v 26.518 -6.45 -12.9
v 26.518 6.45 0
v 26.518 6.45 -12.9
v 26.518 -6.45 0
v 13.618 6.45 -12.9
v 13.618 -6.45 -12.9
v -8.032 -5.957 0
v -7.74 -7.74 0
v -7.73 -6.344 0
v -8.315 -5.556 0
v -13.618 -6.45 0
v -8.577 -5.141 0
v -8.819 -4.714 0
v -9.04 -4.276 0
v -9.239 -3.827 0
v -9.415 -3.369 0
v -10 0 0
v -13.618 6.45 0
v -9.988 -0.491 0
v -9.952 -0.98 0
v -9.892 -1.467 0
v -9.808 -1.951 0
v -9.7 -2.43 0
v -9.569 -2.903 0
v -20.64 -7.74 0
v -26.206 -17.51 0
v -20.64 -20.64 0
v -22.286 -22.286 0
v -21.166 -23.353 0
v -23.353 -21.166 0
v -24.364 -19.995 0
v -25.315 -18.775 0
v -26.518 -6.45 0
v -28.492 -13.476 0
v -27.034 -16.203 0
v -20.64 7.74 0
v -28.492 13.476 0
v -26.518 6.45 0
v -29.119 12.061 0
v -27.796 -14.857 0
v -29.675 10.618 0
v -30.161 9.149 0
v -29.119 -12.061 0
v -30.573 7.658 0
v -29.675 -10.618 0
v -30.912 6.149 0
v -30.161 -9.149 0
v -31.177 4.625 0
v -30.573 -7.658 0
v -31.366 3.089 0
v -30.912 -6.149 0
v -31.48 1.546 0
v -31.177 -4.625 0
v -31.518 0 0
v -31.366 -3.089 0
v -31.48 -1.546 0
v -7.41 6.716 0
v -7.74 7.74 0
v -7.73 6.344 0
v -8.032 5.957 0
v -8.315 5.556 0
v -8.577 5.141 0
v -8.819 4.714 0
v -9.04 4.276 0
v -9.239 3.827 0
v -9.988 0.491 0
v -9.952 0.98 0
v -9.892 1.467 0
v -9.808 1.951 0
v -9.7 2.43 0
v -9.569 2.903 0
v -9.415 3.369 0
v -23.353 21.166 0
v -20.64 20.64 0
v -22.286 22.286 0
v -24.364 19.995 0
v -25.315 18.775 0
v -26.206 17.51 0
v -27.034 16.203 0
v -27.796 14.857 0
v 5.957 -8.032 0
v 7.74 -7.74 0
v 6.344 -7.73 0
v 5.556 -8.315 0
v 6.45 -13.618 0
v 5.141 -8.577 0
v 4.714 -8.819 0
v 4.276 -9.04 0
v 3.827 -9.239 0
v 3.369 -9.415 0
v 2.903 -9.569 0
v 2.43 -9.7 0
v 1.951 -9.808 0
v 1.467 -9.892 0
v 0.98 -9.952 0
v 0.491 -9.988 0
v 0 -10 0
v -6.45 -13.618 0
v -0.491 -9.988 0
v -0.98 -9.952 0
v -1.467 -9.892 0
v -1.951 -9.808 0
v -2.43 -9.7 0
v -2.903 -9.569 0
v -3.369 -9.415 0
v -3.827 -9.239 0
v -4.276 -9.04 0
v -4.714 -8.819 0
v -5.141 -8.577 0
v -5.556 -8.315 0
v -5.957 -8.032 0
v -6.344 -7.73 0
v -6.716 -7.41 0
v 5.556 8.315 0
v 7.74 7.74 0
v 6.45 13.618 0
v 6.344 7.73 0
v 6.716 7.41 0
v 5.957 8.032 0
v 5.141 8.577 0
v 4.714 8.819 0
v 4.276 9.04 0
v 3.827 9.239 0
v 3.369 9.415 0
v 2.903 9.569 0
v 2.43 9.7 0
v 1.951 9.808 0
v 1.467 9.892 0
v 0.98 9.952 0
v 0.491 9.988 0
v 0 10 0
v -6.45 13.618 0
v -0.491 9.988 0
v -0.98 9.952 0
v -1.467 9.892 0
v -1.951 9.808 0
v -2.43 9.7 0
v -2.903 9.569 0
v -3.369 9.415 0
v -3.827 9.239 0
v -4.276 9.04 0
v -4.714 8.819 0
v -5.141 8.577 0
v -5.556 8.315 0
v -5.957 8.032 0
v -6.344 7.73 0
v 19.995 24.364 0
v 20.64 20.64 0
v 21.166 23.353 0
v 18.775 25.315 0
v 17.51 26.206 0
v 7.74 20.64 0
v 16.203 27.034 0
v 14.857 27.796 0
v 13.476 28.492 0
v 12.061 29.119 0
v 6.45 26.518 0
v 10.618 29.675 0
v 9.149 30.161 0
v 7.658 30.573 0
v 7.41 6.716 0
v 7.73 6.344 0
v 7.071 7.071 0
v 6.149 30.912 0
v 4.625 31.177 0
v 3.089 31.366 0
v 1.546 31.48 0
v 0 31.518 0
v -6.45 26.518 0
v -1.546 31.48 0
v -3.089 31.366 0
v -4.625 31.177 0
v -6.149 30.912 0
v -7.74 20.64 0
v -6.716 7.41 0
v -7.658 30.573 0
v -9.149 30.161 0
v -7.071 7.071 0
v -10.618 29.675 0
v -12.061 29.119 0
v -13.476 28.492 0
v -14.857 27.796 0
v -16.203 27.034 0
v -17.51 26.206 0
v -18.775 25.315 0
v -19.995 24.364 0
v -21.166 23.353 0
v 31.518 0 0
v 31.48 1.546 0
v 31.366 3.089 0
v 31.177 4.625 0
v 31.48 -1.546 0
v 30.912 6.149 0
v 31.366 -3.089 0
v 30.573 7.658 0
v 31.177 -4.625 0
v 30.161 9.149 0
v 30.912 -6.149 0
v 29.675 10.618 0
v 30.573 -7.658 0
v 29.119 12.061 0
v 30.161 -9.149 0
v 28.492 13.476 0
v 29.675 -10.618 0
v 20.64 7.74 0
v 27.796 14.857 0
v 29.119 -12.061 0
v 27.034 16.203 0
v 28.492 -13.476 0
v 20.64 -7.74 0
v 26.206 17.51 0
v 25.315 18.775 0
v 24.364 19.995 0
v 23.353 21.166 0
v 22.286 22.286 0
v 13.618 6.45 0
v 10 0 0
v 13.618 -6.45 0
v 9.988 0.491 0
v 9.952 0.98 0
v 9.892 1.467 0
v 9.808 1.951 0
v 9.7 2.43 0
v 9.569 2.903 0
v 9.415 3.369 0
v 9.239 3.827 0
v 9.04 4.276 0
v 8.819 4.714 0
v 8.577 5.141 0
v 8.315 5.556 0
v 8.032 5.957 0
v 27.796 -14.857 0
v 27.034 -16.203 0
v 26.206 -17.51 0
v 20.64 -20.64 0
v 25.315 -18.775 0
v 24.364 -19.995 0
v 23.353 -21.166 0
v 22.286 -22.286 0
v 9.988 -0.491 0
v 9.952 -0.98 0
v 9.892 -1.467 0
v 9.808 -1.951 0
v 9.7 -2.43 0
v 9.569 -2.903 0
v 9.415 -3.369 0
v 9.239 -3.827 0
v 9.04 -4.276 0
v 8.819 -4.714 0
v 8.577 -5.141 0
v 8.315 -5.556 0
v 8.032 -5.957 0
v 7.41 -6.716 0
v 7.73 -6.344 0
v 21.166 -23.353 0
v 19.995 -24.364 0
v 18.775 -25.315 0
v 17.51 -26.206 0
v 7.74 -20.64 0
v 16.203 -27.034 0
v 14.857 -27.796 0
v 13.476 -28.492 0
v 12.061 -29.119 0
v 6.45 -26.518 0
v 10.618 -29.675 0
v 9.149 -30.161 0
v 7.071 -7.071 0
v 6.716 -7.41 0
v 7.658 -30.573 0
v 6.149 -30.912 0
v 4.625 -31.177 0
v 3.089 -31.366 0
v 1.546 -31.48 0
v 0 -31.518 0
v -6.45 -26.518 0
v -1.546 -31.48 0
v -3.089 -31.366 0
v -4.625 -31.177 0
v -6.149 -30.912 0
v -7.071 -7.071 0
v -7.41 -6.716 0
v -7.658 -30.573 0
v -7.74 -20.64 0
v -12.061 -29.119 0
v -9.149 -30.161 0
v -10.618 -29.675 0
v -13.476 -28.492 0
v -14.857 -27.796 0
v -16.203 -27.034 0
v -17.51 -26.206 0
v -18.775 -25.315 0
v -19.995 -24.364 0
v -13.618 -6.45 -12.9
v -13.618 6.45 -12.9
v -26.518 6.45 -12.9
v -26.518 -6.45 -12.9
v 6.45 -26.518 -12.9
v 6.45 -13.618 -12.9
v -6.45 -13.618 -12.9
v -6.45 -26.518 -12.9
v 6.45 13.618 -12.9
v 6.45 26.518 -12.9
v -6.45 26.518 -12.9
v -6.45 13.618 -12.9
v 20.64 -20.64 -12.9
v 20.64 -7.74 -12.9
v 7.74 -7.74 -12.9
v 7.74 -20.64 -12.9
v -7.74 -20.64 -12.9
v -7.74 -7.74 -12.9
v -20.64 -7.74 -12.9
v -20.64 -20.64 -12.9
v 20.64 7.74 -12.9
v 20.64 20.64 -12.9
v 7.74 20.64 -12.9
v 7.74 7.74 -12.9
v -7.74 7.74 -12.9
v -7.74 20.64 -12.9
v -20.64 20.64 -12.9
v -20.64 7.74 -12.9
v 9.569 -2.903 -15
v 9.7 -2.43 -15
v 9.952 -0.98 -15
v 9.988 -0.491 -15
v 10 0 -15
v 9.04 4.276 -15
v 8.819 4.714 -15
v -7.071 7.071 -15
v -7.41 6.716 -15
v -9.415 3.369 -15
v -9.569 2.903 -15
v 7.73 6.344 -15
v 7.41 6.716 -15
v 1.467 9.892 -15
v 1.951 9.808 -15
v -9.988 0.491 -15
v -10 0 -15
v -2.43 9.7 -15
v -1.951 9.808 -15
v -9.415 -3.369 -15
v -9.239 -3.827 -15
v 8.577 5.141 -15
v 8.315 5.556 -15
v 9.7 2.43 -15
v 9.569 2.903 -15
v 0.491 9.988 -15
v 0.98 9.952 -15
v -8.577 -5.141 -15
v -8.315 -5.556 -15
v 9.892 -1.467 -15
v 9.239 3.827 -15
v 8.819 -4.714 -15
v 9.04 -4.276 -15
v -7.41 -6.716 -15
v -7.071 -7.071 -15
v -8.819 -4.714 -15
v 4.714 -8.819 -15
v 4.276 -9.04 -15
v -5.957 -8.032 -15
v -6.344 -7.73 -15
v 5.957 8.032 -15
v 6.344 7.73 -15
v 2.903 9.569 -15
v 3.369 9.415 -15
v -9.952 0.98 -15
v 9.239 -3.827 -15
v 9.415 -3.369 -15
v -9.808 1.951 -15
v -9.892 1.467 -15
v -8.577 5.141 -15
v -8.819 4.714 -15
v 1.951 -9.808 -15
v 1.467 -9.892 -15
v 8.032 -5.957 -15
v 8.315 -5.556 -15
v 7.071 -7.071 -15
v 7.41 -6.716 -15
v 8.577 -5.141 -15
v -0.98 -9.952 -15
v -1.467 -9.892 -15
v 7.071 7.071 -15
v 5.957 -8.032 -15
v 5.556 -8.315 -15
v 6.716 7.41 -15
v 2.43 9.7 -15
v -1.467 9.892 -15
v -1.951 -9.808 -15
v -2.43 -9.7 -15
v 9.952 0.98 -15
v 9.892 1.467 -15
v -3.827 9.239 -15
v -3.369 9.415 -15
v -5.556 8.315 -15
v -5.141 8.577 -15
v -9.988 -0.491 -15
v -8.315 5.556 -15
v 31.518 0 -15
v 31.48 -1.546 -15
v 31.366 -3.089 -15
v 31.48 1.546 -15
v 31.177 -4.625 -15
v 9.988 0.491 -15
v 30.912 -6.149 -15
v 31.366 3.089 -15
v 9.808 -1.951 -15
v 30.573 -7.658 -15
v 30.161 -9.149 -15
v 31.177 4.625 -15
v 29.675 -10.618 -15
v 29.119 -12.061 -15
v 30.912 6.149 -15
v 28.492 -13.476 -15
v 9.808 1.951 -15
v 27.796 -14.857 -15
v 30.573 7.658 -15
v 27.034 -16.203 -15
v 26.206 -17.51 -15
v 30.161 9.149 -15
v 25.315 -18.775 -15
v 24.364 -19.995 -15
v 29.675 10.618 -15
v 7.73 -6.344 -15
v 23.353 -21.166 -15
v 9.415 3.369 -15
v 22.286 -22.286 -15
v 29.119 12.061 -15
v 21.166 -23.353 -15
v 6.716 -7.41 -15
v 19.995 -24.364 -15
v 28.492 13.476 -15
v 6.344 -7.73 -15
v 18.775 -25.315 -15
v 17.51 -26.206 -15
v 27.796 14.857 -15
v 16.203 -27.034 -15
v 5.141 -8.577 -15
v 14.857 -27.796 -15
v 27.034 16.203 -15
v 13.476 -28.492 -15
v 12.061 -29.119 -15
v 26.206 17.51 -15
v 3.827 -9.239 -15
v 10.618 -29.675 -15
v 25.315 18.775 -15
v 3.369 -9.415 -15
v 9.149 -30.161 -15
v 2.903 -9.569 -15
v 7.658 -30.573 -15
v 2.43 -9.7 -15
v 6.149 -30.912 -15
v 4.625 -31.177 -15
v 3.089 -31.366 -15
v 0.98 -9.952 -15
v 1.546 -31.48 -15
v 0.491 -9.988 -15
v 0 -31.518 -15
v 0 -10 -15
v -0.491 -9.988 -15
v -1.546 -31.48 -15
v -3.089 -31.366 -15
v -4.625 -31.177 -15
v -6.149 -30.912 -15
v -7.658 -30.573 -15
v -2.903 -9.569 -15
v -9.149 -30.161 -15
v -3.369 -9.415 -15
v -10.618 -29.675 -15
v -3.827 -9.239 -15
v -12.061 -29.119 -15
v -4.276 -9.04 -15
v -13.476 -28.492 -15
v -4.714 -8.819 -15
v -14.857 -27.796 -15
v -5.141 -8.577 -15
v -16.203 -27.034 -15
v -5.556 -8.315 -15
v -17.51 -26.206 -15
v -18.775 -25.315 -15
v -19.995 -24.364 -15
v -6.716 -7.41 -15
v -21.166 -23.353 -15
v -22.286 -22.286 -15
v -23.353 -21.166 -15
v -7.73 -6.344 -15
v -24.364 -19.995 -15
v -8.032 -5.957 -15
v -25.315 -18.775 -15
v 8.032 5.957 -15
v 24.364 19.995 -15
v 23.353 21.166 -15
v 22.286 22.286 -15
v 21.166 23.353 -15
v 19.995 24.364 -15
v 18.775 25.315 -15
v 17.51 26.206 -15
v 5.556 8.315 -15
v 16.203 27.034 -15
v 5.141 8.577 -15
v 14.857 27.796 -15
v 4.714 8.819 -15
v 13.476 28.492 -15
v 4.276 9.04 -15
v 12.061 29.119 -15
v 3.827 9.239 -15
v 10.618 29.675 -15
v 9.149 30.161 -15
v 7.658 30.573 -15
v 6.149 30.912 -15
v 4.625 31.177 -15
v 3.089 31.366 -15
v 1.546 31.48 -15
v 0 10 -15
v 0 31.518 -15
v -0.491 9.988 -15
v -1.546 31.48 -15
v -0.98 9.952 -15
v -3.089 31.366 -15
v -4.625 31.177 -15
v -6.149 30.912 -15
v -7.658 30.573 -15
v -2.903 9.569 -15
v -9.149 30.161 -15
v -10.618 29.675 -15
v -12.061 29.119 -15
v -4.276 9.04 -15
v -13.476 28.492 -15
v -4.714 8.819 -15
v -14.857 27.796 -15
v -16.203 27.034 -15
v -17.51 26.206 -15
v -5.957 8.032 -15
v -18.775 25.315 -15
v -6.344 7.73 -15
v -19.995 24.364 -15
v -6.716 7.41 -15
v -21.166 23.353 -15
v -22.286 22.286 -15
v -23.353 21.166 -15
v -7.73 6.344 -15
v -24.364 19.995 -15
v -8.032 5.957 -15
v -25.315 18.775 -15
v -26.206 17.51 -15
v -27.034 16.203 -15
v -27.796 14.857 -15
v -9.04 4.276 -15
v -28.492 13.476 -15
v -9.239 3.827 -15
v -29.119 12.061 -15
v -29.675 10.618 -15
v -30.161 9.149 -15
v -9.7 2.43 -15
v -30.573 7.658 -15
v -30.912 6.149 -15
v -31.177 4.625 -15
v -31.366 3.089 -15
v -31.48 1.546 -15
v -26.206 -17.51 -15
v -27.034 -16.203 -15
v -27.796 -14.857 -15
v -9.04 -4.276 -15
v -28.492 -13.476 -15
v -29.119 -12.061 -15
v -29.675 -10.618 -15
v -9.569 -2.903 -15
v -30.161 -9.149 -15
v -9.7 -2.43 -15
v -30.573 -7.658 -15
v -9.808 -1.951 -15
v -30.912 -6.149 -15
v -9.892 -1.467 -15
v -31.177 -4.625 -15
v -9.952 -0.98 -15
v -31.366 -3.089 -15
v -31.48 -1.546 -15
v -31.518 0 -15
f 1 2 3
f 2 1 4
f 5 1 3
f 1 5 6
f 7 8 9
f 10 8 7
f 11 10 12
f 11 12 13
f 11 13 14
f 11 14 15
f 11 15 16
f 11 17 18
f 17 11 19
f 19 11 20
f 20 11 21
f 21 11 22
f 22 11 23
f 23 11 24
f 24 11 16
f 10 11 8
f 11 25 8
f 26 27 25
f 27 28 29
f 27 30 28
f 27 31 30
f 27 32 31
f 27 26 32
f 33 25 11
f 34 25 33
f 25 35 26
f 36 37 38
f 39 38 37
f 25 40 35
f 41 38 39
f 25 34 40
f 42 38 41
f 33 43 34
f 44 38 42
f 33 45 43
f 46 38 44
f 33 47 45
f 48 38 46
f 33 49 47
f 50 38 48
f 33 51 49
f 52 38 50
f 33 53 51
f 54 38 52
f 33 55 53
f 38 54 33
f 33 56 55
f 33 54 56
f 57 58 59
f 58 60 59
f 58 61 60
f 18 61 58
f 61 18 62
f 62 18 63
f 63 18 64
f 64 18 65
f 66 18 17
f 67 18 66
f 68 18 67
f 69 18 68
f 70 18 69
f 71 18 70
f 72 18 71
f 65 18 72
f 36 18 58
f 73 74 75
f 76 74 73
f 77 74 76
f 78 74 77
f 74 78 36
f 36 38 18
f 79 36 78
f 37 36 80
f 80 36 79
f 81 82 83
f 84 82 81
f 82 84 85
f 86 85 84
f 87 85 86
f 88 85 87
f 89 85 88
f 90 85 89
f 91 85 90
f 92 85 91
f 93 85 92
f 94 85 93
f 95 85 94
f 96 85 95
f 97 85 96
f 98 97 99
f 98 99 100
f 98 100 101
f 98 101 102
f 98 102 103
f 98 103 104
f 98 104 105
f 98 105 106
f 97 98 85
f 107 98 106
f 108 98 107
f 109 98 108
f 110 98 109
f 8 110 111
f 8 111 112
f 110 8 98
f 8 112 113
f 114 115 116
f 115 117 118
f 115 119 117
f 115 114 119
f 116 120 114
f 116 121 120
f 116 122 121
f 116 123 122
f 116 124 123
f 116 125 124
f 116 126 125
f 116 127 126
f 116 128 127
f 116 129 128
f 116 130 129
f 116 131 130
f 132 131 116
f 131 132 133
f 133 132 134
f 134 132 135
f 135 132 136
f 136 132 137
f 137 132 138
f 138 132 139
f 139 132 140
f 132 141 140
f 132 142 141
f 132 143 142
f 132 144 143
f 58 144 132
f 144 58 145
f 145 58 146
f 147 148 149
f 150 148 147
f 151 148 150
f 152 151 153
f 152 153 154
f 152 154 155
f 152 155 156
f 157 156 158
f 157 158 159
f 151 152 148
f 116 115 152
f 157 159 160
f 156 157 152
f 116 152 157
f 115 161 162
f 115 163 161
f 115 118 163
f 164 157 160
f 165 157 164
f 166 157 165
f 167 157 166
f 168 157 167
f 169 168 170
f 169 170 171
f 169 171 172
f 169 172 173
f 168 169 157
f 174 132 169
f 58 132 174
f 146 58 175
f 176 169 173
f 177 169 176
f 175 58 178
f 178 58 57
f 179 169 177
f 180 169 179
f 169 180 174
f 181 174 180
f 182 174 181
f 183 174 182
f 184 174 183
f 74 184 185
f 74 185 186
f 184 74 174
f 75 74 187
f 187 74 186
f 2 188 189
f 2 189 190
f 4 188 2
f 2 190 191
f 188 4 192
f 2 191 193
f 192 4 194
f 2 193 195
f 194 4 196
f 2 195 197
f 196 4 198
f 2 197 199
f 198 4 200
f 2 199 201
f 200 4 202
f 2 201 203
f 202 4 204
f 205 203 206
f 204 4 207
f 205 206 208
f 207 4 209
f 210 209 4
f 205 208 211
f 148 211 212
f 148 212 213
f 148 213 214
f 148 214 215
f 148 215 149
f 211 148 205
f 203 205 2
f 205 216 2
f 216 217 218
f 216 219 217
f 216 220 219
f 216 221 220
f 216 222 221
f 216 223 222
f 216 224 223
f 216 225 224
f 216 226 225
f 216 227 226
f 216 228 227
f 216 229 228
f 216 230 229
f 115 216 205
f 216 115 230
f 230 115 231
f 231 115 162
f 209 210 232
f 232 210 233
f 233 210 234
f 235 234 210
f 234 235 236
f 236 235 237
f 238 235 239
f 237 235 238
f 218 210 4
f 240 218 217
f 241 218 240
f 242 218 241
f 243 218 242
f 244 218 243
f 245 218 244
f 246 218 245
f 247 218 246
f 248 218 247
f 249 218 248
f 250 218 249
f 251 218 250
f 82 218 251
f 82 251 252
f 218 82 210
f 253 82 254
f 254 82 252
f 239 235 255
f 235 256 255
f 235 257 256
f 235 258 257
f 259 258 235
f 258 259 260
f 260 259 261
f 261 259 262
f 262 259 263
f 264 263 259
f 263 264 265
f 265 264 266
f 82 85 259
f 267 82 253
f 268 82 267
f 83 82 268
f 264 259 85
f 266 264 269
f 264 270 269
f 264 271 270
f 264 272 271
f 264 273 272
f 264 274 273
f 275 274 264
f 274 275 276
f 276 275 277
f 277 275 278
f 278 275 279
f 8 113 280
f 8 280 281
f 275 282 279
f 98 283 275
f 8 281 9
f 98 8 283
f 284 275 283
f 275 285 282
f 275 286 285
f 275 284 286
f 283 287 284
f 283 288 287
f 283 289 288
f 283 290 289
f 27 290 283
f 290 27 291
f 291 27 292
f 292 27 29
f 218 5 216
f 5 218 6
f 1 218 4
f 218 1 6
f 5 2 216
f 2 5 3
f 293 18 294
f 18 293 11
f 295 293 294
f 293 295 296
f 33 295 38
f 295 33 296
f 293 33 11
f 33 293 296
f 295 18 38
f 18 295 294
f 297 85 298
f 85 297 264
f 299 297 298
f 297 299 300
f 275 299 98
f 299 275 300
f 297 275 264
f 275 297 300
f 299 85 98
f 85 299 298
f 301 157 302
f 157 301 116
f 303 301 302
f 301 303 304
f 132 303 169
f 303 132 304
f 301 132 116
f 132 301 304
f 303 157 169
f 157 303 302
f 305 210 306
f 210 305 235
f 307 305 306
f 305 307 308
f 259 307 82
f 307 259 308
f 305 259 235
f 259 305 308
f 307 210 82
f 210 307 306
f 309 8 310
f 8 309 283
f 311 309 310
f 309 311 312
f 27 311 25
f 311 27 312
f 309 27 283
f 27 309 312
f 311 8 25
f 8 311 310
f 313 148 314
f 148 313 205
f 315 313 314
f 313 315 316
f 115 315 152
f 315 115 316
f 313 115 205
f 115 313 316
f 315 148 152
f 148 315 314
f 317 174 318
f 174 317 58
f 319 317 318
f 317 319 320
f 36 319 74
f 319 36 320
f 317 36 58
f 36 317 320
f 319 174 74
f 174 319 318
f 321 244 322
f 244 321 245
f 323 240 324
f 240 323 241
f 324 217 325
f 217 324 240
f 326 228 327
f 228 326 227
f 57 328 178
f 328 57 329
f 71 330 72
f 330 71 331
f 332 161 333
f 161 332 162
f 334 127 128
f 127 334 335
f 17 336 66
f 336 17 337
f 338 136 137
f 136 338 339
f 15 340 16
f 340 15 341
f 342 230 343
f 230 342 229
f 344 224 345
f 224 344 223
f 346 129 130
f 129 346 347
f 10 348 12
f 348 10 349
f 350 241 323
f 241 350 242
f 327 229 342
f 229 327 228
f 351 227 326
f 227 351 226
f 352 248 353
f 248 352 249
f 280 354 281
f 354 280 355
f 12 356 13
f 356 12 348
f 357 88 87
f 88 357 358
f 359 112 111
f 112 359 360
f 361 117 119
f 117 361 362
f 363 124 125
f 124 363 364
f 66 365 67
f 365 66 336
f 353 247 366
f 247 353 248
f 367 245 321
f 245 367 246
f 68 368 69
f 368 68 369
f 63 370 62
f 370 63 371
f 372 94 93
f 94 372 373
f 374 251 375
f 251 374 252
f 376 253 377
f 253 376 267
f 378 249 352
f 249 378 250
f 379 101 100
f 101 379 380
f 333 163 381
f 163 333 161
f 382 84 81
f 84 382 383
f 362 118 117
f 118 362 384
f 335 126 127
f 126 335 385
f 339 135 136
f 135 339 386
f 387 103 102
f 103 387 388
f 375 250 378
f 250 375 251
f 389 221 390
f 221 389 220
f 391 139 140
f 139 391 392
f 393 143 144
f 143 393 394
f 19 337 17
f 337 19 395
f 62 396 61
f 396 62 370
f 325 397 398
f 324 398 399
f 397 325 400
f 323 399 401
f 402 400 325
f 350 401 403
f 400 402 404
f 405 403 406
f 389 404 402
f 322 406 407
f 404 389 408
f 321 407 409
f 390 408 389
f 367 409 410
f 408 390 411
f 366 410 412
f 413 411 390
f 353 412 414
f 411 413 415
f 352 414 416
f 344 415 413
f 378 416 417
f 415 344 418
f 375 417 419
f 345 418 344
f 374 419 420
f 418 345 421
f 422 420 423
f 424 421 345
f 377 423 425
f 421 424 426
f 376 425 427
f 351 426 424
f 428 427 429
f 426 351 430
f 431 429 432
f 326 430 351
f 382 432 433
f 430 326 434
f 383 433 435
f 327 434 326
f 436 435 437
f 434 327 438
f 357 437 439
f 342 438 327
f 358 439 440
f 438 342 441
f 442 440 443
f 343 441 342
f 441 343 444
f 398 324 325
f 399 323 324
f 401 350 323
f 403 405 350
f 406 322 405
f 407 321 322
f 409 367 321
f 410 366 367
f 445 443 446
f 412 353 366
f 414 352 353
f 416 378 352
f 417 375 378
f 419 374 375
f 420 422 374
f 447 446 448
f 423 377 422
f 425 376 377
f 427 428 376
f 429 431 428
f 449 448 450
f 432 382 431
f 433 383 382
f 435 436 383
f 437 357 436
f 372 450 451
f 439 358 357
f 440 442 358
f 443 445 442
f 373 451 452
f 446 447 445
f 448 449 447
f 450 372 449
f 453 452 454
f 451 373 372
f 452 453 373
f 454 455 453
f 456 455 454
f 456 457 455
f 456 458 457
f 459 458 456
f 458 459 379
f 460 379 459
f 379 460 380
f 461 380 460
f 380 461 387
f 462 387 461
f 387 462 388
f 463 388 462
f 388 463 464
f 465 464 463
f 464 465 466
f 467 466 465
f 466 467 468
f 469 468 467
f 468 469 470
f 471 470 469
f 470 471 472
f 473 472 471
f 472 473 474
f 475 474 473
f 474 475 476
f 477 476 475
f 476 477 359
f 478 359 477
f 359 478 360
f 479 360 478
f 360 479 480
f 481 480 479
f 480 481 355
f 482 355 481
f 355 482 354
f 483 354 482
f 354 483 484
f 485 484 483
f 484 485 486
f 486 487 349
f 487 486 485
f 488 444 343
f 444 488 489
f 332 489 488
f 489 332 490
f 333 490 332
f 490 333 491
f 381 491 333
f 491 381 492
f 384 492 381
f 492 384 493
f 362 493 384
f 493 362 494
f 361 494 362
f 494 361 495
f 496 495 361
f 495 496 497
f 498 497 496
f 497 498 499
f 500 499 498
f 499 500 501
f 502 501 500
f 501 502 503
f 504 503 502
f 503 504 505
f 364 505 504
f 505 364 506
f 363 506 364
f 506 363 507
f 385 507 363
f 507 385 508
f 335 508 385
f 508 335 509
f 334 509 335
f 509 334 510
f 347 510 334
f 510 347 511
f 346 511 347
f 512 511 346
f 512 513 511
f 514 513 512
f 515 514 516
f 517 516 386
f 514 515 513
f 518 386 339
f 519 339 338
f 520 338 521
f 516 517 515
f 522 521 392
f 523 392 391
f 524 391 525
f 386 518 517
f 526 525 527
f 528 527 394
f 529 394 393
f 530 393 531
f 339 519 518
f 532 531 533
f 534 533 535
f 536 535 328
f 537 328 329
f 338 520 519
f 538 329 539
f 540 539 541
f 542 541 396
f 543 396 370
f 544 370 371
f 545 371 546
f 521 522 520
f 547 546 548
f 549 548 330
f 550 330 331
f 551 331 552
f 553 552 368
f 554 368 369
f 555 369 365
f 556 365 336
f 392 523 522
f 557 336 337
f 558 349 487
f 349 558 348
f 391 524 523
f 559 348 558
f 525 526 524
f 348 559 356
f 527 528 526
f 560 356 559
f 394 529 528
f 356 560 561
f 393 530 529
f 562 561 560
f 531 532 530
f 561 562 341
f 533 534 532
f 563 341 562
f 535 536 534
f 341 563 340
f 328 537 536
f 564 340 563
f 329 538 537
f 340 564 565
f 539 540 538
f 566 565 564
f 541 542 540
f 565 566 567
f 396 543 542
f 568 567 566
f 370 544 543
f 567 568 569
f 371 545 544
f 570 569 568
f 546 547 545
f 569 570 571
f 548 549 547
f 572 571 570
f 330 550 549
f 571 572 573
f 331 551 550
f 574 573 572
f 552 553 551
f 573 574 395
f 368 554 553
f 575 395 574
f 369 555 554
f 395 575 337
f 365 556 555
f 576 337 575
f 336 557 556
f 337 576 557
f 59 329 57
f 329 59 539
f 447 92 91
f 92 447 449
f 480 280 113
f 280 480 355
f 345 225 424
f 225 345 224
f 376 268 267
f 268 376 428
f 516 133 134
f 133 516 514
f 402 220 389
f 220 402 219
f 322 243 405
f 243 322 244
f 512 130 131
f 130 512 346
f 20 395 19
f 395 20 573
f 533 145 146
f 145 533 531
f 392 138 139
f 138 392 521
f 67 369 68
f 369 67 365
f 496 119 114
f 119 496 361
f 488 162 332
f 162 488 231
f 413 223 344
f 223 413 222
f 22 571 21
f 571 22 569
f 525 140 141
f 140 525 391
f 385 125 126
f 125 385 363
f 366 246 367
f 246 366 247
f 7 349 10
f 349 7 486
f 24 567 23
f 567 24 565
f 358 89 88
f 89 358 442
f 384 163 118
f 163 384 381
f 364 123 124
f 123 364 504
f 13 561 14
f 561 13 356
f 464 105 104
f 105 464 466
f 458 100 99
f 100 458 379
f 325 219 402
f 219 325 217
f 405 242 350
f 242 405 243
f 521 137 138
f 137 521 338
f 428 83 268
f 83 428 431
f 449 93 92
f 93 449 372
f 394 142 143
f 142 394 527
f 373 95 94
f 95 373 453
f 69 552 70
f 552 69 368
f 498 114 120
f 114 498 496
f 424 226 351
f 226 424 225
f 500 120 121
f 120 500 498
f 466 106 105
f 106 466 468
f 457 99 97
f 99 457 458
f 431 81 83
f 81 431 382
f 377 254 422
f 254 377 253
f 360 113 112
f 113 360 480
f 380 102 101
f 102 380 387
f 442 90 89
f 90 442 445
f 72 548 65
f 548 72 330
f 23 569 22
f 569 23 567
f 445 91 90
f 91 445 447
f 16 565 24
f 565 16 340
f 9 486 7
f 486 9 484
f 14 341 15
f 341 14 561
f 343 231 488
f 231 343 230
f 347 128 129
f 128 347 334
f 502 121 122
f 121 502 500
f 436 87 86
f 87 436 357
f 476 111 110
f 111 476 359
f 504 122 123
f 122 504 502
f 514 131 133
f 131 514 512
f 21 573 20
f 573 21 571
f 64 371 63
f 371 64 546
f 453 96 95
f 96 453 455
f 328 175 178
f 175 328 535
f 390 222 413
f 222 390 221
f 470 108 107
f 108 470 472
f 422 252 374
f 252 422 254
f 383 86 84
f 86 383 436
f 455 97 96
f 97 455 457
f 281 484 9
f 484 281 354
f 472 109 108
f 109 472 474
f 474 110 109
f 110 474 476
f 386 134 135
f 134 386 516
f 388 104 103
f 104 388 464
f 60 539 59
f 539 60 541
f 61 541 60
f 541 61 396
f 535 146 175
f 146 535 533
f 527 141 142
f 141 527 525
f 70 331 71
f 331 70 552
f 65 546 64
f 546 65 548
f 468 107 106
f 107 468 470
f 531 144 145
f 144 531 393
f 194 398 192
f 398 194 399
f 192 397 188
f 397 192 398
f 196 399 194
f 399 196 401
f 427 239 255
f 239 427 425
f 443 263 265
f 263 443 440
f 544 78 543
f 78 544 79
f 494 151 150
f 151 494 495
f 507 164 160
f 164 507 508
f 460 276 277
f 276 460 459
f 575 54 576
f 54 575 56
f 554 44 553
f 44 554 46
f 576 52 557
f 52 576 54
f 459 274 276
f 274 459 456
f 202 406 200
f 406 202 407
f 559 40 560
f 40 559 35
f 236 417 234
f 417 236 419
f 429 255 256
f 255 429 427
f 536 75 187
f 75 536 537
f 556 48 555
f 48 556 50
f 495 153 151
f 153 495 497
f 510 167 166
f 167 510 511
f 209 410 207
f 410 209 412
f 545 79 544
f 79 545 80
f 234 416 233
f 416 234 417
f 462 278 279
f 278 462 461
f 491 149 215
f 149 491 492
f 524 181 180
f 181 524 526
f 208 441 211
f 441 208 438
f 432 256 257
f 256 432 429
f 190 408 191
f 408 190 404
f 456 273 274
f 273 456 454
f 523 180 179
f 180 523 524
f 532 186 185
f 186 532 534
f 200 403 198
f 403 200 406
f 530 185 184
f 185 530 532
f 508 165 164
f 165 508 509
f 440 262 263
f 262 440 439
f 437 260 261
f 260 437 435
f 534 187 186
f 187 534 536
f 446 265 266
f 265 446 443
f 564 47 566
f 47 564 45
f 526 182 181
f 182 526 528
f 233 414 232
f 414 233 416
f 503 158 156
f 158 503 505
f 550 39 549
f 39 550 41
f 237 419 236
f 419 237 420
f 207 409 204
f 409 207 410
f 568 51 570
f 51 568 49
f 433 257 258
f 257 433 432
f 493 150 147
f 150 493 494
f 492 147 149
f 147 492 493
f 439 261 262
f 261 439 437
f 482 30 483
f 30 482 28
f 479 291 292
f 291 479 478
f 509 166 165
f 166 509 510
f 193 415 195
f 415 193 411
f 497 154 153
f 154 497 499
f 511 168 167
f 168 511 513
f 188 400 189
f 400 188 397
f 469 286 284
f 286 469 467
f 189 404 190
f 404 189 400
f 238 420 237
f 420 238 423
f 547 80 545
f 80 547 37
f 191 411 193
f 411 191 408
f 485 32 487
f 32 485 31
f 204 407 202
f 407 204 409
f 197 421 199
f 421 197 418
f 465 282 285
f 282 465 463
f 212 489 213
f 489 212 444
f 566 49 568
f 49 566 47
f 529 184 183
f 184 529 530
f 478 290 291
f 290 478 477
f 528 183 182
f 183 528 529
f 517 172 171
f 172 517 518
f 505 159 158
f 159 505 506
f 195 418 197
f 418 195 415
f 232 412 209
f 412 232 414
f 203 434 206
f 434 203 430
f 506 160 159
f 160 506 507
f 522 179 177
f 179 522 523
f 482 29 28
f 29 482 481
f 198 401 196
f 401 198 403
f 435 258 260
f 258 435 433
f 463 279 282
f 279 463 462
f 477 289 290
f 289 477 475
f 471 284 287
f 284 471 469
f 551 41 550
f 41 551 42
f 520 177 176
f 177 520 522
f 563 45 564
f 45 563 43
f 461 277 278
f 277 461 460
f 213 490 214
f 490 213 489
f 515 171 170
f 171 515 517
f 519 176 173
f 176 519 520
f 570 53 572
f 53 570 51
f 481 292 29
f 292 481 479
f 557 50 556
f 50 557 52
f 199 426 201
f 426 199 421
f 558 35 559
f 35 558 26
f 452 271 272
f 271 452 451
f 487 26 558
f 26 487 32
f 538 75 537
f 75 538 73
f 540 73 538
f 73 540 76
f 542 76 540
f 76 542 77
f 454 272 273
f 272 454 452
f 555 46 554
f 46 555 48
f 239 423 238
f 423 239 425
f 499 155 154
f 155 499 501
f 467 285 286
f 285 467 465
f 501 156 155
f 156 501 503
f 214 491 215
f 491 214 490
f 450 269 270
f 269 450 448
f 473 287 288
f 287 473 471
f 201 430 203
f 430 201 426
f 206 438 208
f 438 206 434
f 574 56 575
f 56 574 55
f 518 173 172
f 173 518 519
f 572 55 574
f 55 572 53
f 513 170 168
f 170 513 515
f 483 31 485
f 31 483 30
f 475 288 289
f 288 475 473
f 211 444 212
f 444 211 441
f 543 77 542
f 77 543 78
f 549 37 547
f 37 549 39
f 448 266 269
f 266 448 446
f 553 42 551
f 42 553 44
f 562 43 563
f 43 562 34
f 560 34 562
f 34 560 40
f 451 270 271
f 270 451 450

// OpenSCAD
module render()
{
  corrective_shim = 0.2;
  cube_dim = 12.7 + corrective_shim;
  margin = 5;
  inner_hyp = cube_dim * 2.2;
  inner_radius = sqrt((inner_hyp*inner_hyp)/2.0);
  disk_radius = inner_radius + cube_dim/2.0 + margin;
  diag_radius = inner_radius * 0.70710678118; // sin 45 degrees
  sample_area_radius = 20 / 2.0;
  thickness = 15;
  fn = 128;

  rotate(a=180, v=[1,0,0])
  difference() {
    cylinder(h = thickness,
             r1 = disk_radius,
             r2 = disk_radius, $fn=fn);
    union() {
      translate([inner_radius, 0, cube_dim/2])
      cube(size = [cube_dim, cube_dim, cube_dim], center=true);
      translate([-inner_radius, 0, cube_dim/2])
      cube(size = [cube_dim, cube_dim, cube_dim], center=true);
      translate([0, inner_radius, cube_dim/2])
      cube(size = [cube_dim, cube_dim, cube_dim], center=true);
      translate([0, -inner_radius, cube_dim/2])
      cube(size = [cube_dim, cube_dim, cube_dim], center=true);

      translate([diag_radius, diag_radius, cube_dim/2])
      cube(size = [cube_dim, cube_dim, cube_dim], center=true);
      translate([-diag_radius, diag_radius, cube_dim/2])
      cube(size = [cube_dim, cube_dim, cube_dim], center=true);
      translate([diag_radius, -diag_radius, cube_dim/2])
      cube(size = [cube_dim, cube_dim, cube_dim], center=true);
      translate([-diag_radius, -diag_radius, cube_dim/2])
      cube(size = [cube_dim, cube_dim, cube_dim], center=true);

      cylinder(h = thickness,
         r1 = sample_area_radius,
         r2 = sample_area_radius, $fn=fn);
    }
  }
}

echo(version=version());

render();
